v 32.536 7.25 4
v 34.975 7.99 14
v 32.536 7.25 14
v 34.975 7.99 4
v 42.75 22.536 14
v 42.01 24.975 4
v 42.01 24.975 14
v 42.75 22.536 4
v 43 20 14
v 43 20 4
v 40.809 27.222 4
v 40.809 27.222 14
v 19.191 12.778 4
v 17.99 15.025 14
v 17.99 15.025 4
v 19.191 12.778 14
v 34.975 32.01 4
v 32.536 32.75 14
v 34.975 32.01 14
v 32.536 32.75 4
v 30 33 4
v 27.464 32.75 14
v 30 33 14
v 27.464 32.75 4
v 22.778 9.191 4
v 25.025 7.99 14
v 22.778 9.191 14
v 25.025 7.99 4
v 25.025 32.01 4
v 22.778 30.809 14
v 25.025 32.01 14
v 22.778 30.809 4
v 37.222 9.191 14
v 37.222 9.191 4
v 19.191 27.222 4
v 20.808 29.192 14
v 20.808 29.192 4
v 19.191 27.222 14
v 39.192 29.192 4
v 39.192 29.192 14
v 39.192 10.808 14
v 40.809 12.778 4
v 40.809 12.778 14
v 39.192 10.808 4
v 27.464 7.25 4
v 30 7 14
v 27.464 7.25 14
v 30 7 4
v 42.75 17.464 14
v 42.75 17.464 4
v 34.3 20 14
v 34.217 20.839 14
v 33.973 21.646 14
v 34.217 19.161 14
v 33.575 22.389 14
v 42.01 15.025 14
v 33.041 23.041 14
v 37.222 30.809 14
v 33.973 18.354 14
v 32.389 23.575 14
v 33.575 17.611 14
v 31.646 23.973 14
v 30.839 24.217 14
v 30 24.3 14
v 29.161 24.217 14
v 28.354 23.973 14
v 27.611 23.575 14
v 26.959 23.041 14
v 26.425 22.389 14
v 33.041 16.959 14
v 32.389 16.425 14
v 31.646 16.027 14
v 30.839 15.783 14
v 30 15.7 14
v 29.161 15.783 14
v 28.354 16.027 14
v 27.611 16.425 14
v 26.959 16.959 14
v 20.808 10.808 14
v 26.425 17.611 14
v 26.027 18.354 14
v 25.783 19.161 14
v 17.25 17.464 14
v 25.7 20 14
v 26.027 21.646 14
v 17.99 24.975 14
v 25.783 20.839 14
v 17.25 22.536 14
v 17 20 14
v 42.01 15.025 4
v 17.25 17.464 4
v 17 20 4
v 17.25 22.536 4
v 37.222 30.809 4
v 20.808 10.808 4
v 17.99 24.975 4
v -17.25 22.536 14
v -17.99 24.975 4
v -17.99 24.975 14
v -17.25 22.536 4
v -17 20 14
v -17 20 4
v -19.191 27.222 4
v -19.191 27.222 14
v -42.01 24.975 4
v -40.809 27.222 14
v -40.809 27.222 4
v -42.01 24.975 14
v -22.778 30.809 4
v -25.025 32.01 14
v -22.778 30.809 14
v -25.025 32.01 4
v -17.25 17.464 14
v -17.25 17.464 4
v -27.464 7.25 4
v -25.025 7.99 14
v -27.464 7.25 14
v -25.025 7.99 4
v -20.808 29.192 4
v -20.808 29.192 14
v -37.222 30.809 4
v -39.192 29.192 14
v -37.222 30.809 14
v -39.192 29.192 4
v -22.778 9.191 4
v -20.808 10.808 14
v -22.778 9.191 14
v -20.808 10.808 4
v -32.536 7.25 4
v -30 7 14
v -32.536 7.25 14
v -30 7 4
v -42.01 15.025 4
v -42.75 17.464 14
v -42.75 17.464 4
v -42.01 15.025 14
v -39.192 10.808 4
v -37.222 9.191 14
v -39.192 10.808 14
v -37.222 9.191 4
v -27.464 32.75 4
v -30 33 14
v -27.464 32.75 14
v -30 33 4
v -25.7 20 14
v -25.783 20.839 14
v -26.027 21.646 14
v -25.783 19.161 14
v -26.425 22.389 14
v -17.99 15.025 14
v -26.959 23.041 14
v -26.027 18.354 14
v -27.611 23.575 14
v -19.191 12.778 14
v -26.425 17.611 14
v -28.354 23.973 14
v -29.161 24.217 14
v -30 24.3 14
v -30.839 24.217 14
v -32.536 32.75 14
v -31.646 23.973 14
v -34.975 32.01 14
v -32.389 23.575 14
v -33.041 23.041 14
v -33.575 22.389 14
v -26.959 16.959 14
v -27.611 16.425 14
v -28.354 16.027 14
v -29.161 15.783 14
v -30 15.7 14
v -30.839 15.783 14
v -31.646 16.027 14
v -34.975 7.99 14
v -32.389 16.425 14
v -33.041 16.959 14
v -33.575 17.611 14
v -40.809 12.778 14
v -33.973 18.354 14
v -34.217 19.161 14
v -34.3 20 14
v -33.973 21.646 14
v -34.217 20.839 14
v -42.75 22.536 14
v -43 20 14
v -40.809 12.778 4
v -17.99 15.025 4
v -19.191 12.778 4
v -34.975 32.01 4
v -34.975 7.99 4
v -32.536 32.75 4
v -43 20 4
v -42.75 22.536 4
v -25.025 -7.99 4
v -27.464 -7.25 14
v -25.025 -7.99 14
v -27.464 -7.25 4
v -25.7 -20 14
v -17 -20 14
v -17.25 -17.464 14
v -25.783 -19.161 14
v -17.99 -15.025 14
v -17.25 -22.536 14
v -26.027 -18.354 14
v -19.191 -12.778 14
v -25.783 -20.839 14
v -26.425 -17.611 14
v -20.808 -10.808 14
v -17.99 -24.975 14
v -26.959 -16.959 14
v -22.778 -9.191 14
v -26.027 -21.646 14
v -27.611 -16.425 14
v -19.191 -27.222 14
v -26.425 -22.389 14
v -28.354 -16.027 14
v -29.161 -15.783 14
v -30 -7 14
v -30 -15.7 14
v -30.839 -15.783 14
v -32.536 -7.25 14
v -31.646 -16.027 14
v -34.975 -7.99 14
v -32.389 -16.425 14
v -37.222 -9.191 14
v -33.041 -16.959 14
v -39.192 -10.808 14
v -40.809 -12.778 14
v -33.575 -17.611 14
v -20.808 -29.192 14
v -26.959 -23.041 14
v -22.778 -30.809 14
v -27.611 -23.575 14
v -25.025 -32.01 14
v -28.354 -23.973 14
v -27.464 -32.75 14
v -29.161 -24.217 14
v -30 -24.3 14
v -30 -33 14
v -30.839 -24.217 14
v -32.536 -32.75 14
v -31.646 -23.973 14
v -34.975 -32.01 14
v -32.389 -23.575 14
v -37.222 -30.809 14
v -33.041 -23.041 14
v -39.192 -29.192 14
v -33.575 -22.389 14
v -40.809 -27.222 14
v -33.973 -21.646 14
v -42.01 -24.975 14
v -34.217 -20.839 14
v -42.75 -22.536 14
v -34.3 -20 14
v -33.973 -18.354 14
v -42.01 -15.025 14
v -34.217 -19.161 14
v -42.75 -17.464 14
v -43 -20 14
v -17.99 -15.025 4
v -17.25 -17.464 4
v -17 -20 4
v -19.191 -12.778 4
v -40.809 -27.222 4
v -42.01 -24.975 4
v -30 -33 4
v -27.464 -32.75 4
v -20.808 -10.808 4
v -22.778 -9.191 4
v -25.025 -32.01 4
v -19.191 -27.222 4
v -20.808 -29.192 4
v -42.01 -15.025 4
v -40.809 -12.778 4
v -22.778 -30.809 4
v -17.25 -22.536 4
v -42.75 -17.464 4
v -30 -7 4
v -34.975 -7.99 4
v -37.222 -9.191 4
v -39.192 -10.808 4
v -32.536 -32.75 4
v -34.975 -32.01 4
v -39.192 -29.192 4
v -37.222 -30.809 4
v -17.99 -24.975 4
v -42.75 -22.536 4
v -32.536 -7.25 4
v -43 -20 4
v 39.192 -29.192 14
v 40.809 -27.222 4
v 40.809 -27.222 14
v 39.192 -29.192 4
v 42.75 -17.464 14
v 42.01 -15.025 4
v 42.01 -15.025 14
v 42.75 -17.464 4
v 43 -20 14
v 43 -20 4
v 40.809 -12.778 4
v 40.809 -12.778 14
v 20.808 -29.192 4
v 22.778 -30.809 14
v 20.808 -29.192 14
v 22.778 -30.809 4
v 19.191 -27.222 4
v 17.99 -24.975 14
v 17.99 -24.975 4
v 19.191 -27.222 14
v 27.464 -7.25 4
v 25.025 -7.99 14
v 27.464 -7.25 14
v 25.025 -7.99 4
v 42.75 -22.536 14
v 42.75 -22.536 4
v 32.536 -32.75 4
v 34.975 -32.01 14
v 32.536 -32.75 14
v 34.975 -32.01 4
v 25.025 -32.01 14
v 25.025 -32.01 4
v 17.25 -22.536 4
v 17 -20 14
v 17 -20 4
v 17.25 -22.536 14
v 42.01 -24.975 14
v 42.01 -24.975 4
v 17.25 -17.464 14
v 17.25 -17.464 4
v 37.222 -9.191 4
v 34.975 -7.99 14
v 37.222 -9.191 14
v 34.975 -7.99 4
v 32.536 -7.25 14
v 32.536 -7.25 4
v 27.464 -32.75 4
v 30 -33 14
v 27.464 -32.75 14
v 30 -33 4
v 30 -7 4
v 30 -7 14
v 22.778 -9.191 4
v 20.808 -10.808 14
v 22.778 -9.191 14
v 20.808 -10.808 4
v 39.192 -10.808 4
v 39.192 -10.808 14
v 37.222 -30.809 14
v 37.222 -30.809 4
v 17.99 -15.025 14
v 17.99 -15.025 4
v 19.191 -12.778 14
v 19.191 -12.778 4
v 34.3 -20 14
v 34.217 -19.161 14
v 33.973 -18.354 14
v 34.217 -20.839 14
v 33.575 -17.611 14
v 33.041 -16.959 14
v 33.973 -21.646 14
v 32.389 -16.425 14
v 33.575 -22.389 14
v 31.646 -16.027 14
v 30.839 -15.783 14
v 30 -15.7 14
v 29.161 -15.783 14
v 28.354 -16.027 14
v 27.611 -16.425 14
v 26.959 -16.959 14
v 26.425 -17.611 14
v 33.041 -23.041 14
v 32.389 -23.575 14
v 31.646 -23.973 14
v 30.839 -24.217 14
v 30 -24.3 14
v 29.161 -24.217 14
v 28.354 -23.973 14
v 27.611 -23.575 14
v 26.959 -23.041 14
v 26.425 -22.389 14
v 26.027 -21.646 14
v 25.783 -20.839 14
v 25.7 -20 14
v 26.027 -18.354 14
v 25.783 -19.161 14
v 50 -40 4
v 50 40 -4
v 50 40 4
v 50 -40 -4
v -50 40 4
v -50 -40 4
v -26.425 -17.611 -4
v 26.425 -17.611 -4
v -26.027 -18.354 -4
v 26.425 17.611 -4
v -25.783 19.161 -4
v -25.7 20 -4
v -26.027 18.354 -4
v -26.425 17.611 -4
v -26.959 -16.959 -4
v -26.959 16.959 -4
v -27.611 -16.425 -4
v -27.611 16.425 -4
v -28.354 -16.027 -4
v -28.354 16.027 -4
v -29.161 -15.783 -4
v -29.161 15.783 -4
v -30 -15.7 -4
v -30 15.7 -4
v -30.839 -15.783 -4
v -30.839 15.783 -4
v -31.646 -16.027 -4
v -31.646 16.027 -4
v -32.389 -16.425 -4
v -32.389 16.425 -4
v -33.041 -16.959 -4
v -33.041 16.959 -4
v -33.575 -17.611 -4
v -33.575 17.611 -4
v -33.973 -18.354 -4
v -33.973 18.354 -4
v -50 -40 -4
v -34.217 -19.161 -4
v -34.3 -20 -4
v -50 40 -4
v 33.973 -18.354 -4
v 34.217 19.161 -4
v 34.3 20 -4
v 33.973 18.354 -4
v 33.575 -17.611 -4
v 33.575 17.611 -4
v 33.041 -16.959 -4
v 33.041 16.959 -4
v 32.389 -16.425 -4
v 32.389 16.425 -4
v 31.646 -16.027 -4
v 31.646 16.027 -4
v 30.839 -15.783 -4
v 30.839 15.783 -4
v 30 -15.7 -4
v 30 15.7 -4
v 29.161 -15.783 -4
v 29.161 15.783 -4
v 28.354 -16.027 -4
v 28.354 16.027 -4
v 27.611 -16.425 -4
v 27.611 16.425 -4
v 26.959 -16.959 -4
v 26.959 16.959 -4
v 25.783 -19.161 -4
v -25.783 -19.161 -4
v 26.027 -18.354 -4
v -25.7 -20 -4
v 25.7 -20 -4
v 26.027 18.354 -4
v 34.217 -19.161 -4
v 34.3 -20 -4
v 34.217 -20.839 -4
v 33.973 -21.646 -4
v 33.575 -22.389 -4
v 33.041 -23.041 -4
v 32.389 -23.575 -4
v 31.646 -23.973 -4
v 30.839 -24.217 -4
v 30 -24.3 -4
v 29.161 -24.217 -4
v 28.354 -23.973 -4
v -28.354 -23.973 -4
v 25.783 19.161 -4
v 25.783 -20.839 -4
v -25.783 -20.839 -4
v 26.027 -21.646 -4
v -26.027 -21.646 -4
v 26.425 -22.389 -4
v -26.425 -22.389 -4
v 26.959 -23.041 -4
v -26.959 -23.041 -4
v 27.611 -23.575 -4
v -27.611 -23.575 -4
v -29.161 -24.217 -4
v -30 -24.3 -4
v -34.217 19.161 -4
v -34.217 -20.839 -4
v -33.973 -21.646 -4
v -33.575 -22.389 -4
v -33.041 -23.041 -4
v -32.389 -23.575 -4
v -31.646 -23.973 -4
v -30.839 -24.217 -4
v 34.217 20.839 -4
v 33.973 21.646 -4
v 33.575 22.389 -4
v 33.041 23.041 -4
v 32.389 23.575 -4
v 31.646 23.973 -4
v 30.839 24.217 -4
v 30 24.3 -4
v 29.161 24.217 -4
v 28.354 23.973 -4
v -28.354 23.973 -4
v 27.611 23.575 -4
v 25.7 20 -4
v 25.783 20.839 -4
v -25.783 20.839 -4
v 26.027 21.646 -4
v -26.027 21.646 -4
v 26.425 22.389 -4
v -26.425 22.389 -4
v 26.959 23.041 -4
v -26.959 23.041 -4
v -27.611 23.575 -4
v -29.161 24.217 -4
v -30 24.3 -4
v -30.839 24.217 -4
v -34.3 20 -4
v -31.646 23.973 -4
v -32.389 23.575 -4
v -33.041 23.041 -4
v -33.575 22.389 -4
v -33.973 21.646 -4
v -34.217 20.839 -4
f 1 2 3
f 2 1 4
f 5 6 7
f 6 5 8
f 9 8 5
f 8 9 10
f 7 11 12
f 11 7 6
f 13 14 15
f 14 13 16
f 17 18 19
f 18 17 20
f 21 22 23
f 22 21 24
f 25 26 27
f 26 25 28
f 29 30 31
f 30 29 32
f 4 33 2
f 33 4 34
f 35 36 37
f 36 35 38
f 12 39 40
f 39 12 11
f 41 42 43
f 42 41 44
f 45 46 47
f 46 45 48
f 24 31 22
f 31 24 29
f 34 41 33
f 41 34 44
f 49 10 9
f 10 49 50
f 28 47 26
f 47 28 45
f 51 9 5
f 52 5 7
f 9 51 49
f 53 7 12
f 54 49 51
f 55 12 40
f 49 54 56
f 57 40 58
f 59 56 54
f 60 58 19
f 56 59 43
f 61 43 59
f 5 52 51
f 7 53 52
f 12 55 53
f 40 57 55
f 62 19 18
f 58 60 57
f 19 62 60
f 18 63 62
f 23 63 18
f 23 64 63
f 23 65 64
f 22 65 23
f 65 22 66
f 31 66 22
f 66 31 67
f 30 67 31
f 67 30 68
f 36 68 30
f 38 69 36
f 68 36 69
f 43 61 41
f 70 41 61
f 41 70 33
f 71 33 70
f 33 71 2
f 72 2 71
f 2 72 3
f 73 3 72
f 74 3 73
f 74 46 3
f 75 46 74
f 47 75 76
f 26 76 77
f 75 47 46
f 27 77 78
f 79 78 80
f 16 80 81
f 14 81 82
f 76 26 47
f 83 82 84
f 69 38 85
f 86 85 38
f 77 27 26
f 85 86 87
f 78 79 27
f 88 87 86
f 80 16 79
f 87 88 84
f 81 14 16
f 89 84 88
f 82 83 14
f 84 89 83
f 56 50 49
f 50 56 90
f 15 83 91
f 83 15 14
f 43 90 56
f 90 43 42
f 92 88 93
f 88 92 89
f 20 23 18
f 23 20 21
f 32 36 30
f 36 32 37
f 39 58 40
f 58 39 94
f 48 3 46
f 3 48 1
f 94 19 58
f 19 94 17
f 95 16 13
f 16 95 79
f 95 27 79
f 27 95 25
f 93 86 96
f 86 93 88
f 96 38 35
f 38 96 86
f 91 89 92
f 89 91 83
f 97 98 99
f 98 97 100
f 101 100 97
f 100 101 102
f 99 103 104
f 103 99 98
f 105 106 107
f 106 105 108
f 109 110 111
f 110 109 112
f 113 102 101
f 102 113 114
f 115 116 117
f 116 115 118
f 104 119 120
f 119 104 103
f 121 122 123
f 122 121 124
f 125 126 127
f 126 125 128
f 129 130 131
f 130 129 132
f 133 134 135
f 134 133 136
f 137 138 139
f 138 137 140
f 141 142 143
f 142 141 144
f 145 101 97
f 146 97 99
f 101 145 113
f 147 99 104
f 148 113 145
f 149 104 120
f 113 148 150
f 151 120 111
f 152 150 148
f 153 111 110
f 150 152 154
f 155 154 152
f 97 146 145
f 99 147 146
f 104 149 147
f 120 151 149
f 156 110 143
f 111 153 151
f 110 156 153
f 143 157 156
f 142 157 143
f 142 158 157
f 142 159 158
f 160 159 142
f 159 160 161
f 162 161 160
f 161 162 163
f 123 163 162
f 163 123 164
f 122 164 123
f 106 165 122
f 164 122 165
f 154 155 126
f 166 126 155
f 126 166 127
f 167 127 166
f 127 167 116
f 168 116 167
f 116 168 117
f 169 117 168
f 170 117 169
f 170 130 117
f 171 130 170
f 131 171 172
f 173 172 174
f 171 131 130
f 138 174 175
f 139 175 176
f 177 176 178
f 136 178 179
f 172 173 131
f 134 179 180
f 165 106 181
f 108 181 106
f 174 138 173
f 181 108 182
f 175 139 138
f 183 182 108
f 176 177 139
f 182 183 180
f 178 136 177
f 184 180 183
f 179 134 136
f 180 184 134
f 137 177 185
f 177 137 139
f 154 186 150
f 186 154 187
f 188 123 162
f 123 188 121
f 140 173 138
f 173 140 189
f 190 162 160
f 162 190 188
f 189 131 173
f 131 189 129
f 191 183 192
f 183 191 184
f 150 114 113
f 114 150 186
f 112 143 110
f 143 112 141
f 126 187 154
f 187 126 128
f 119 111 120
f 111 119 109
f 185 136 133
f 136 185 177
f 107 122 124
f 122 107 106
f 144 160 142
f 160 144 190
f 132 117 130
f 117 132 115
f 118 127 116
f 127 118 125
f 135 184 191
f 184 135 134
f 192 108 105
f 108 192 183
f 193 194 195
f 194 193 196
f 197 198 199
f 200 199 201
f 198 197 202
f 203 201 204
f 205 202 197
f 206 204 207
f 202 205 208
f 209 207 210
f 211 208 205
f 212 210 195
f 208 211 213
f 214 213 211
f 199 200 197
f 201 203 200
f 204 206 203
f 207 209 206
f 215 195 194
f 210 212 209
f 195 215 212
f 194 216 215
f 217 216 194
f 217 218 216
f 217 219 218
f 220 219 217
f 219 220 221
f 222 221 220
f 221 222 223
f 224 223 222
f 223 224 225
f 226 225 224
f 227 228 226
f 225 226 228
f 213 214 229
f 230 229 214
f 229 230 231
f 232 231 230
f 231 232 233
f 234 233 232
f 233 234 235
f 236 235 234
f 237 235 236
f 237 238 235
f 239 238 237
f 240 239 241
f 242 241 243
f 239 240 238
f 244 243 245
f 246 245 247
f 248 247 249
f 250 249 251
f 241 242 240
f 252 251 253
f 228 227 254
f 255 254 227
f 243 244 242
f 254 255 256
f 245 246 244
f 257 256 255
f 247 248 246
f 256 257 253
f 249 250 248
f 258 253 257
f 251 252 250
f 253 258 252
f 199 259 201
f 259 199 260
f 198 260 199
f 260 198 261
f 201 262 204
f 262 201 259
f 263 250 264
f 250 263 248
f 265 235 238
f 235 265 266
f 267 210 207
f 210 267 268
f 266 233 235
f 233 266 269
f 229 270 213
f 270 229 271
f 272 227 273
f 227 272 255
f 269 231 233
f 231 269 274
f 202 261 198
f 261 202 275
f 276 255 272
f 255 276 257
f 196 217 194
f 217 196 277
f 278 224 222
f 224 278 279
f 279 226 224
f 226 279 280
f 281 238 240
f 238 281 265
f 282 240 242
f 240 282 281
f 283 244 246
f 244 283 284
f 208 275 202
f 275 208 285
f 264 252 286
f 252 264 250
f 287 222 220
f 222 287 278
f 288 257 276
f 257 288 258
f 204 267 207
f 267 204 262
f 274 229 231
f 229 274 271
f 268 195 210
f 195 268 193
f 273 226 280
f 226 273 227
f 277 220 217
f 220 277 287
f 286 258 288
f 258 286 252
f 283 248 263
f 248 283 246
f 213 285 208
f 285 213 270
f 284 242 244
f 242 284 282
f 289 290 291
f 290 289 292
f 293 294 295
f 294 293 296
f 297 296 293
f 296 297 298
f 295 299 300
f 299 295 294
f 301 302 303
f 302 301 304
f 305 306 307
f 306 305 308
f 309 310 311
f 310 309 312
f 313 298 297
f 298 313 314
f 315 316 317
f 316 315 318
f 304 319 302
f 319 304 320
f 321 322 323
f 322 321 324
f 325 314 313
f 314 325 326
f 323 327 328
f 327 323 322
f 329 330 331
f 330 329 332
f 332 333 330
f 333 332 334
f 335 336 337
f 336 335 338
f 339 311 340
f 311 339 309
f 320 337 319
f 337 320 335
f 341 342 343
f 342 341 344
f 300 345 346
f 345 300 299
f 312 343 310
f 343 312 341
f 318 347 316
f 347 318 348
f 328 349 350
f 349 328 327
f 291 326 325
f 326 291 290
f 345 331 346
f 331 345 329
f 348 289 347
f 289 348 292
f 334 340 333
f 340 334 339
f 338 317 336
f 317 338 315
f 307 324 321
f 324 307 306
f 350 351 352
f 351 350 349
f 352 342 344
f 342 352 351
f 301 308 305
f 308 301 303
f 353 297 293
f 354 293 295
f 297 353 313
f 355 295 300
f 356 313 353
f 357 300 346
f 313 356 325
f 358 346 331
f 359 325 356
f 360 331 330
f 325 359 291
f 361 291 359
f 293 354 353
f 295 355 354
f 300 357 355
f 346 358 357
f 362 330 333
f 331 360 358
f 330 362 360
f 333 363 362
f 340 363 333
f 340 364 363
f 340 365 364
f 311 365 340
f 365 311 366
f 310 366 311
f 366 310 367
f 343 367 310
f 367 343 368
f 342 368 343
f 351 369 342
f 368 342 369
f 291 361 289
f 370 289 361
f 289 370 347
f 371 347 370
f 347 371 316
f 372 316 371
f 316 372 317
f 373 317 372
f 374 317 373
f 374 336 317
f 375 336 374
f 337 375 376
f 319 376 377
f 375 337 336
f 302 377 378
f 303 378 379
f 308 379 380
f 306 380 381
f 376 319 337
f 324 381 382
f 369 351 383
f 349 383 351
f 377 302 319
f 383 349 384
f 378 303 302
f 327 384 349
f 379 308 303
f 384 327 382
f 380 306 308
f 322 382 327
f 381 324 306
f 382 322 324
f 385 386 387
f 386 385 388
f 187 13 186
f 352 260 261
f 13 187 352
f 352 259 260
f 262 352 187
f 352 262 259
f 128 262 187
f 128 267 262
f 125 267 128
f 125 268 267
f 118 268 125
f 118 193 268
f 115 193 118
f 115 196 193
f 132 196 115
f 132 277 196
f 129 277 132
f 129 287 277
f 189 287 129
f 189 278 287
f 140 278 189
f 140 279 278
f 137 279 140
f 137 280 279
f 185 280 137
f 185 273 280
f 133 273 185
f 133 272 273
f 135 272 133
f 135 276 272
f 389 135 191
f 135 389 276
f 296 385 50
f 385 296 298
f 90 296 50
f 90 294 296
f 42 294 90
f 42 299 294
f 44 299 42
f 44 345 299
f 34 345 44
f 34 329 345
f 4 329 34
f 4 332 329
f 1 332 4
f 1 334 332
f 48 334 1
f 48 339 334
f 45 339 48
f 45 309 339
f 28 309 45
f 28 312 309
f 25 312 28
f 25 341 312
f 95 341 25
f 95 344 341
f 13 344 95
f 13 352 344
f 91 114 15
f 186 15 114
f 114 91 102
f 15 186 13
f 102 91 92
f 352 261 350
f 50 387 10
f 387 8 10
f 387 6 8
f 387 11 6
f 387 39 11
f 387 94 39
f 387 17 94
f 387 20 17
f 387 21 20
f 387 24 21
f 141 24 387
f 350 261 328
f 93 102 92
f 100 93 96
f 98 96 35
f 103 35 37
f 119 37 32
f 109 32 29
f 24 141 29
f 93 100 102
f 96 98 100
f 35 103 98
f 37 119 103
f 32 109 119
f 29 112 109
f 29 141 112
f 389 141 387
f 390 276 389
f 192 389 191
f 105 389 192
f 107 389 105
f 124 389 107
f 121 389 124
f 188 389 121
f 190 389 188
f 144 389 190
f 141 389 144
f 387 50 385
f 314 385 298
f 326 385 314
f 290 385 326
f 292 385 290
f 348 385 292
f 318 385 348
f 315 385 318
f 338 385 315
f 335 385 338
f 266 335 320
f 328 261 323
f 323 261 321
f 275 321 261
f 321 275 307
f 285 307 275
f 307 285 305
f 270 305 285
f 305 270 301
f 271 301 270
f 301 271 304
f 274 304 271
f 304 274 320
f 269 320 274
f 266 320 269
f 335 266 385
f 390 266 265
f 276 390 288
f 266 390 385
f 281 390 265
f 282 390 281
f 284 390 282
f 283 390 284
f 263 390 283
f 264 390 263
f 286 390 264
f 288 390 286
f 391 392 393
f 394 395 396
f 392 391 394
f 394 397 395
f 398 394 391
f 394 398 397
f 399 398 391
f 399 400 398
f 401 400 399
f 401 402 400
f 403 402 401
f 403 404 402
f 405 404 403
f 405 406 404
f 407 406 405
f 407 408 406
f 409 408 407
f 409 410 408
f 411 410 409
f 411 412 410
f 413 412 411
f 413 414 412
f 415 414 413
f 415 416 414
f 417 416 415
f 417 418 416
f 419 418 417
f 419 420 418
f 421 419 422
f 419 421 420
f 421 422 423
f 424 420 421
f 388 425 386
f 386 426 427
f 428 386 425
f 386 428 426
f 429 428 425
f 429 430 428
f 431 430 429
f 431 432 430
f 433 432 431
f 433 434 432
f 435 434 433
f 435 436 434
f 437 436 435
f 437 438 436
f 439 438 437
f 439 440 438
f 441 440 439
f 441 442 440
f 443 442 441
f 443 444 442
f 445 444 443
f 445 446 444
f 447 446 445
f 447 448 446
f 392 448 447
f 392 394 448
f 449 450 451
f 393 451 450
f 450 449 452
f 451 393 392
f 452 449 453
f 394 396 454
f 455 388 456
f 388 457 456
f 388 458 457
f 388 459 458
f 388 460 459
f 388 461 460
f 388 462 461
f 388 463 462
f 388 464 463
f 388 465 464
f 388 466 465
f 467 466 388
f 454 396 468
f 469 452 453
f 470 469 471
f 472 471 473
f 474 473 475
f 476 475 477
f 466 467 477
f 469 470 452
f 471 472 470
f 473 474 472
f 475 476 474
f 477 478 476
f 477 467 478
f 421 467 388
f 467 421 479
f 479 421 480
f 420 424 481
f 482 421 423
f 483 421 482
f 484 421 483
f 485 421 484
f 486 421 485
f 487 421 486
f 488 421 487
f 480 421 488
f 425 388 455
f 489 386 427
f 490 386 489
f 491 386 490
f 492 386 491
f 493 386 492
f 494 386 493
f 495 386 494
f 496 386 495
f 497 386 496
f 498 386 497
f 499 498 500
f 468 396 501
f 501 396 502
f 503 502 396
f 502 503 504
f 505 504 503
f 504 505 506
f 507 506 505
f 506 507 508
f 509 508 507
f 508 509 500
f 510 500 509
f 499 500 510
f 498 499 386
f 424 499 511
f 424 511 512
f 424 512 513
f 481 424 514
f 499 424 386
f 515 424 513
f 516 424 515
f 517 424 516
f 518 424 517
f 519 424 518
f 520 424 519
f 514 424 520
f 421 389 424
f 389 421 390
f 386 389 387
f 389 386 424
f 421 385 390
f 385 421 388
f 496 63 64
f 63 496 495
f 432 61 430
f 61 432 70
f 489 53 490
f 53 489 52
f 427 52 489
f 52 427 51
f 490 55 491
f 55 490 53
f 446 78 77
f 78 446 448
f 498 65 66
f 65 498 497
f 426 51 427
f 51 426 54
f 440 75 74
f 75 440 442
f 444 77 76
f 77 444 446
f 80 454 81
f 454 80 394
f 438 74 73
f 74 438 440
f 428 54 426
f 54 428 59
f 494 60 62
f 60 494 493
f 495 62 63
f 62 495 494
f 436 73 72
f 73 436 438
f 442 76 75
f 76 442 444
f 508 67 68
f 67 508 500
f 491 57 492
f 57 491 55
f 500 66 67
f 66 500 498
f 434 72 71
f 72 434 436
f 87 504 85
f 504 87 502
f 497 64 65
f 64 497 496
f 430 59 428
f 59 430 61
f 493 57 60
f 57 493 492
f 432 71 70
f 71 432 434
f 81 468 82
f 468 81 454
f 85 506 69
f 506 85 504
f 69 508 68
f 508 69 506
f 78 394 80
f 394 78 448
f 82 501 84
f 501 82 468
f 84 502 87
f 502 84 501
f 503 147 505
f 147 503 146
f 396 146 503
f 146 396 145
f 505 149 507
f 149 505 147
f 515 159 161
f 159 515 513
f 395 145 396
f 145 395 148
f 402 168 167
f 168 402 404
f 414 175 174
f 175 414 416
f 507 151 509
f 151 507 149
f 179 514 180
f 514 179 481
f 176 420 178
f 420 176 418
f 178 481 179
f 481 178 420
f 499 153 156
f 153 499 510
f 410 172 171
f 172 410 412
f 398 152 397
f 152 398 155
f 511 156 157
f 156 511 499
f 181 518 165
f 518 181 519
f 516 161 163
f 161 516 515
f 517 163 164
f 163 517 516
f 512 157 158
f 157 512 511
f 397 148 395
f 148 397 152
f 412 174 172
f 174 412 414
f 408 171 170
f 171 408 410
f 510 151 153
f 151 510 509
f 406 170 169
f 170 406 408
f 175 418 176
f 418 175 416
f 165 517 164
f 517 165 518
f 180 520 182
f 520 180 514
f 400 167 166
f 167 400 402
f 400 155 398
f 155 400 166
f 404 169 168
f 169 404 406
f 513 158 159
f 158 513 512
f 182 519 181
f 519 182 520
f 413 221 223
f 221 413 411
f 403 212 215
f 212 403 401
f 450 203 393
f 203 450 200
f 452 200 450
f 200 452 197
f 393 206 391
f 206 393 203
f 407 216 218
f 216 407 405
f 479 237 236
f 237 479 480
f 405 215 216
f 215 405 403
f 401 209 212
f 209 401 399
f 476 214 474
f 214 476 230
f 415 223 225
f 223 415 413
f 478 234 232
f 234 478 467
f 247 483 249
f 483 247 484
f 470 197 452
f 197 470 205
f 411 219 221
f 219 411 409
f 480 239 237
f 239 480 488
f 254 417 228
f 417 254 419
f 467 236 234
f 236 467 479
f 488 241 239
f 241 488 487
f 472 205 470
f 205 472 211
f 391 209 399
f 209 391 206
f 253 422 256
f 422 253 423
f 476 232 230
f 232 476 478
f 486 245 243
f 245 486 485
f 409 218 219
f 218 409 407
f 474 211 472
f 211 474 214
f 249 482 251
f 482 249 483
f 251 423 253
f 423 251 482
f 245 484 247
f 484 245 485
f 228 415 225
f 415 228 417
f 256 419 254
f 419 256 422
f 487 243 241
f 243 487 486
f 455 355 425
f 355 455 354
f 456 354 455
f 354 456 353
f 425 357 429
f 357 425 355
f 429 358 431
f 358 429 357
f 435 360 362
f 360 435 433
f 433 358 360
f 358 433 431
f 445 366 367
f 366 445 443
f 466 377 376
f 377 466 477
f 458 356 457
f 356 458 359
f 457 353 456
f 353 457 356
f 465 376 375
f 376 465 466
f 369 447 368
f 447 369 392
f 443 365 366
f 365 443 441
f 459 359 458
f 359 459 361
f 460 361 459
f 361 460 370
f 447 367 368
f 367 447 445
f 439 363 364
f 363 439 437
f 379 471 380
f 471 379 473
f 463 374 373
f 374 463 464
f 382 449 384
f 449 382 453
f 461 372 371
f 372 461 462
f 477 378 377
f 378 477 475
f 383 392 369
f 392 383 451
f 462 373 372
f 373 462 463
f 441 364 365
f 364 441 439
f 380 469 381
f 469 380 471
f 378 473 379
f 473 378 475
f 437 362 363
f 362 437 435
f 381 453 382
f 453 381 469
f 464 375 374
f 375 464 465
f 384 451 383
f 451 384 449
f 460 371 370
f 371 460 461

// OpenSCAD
$fn = 32;

// ----------------------------------------------------------------------
// Anchor pads 100 x 80 x 18
// four corner bosses with anchor holes
// ----------------------------------------------------------------------

// --- parameters (mm) ---
plate = [100, 80, 8];   // base plate size (x, y, z)
pads = 4;               // boss count, one per corner
edge = 20;              // boss centre offset from the plate edge
boss_d = 26;            // boss diameter
boss_h = 10;            // boss height above the base plate
bore_d = 8.4;           // nominal hole diameter from the drawing
print_allowance = 0.2;  // clearance added for printing

// --- derived feature positions (mm) ---
hole_d = bore_d + print_allowance;  // = 8.6   hole diameter as printed
height = plate[2] + boss_h;         // = 18   overall height of the part
corner_x = plate[0] / 2 - edge;     // = 30   boss centre X
corner_y = plate[1] / 2 - edge;     // = 20   boss centre Y
feature_centers = [
  [corner_x, corner_y],
  [-corner_x, corner_y],
  [-corner_x, -corner_y],
  [corner_x, -corner_y]
];   // boss centres, anchor holes are drilled there

// base plate, four bosses standing on it, anchor holes all the way through
difference() {
  union() {
    cube(plate, center = true);
    for (centre = feature_centers)
      translate([centre[0], centre[1], plate[2] / 2 - 1])
        cylinder(d = boss_d, h = boss_h + 1);
  }
  for (centre = feature_centers)
    translate([centre[0], centre[1], -height])
      cylinder(d = hole_d, h = 2 * height + 2);  // through boss and plate
}
